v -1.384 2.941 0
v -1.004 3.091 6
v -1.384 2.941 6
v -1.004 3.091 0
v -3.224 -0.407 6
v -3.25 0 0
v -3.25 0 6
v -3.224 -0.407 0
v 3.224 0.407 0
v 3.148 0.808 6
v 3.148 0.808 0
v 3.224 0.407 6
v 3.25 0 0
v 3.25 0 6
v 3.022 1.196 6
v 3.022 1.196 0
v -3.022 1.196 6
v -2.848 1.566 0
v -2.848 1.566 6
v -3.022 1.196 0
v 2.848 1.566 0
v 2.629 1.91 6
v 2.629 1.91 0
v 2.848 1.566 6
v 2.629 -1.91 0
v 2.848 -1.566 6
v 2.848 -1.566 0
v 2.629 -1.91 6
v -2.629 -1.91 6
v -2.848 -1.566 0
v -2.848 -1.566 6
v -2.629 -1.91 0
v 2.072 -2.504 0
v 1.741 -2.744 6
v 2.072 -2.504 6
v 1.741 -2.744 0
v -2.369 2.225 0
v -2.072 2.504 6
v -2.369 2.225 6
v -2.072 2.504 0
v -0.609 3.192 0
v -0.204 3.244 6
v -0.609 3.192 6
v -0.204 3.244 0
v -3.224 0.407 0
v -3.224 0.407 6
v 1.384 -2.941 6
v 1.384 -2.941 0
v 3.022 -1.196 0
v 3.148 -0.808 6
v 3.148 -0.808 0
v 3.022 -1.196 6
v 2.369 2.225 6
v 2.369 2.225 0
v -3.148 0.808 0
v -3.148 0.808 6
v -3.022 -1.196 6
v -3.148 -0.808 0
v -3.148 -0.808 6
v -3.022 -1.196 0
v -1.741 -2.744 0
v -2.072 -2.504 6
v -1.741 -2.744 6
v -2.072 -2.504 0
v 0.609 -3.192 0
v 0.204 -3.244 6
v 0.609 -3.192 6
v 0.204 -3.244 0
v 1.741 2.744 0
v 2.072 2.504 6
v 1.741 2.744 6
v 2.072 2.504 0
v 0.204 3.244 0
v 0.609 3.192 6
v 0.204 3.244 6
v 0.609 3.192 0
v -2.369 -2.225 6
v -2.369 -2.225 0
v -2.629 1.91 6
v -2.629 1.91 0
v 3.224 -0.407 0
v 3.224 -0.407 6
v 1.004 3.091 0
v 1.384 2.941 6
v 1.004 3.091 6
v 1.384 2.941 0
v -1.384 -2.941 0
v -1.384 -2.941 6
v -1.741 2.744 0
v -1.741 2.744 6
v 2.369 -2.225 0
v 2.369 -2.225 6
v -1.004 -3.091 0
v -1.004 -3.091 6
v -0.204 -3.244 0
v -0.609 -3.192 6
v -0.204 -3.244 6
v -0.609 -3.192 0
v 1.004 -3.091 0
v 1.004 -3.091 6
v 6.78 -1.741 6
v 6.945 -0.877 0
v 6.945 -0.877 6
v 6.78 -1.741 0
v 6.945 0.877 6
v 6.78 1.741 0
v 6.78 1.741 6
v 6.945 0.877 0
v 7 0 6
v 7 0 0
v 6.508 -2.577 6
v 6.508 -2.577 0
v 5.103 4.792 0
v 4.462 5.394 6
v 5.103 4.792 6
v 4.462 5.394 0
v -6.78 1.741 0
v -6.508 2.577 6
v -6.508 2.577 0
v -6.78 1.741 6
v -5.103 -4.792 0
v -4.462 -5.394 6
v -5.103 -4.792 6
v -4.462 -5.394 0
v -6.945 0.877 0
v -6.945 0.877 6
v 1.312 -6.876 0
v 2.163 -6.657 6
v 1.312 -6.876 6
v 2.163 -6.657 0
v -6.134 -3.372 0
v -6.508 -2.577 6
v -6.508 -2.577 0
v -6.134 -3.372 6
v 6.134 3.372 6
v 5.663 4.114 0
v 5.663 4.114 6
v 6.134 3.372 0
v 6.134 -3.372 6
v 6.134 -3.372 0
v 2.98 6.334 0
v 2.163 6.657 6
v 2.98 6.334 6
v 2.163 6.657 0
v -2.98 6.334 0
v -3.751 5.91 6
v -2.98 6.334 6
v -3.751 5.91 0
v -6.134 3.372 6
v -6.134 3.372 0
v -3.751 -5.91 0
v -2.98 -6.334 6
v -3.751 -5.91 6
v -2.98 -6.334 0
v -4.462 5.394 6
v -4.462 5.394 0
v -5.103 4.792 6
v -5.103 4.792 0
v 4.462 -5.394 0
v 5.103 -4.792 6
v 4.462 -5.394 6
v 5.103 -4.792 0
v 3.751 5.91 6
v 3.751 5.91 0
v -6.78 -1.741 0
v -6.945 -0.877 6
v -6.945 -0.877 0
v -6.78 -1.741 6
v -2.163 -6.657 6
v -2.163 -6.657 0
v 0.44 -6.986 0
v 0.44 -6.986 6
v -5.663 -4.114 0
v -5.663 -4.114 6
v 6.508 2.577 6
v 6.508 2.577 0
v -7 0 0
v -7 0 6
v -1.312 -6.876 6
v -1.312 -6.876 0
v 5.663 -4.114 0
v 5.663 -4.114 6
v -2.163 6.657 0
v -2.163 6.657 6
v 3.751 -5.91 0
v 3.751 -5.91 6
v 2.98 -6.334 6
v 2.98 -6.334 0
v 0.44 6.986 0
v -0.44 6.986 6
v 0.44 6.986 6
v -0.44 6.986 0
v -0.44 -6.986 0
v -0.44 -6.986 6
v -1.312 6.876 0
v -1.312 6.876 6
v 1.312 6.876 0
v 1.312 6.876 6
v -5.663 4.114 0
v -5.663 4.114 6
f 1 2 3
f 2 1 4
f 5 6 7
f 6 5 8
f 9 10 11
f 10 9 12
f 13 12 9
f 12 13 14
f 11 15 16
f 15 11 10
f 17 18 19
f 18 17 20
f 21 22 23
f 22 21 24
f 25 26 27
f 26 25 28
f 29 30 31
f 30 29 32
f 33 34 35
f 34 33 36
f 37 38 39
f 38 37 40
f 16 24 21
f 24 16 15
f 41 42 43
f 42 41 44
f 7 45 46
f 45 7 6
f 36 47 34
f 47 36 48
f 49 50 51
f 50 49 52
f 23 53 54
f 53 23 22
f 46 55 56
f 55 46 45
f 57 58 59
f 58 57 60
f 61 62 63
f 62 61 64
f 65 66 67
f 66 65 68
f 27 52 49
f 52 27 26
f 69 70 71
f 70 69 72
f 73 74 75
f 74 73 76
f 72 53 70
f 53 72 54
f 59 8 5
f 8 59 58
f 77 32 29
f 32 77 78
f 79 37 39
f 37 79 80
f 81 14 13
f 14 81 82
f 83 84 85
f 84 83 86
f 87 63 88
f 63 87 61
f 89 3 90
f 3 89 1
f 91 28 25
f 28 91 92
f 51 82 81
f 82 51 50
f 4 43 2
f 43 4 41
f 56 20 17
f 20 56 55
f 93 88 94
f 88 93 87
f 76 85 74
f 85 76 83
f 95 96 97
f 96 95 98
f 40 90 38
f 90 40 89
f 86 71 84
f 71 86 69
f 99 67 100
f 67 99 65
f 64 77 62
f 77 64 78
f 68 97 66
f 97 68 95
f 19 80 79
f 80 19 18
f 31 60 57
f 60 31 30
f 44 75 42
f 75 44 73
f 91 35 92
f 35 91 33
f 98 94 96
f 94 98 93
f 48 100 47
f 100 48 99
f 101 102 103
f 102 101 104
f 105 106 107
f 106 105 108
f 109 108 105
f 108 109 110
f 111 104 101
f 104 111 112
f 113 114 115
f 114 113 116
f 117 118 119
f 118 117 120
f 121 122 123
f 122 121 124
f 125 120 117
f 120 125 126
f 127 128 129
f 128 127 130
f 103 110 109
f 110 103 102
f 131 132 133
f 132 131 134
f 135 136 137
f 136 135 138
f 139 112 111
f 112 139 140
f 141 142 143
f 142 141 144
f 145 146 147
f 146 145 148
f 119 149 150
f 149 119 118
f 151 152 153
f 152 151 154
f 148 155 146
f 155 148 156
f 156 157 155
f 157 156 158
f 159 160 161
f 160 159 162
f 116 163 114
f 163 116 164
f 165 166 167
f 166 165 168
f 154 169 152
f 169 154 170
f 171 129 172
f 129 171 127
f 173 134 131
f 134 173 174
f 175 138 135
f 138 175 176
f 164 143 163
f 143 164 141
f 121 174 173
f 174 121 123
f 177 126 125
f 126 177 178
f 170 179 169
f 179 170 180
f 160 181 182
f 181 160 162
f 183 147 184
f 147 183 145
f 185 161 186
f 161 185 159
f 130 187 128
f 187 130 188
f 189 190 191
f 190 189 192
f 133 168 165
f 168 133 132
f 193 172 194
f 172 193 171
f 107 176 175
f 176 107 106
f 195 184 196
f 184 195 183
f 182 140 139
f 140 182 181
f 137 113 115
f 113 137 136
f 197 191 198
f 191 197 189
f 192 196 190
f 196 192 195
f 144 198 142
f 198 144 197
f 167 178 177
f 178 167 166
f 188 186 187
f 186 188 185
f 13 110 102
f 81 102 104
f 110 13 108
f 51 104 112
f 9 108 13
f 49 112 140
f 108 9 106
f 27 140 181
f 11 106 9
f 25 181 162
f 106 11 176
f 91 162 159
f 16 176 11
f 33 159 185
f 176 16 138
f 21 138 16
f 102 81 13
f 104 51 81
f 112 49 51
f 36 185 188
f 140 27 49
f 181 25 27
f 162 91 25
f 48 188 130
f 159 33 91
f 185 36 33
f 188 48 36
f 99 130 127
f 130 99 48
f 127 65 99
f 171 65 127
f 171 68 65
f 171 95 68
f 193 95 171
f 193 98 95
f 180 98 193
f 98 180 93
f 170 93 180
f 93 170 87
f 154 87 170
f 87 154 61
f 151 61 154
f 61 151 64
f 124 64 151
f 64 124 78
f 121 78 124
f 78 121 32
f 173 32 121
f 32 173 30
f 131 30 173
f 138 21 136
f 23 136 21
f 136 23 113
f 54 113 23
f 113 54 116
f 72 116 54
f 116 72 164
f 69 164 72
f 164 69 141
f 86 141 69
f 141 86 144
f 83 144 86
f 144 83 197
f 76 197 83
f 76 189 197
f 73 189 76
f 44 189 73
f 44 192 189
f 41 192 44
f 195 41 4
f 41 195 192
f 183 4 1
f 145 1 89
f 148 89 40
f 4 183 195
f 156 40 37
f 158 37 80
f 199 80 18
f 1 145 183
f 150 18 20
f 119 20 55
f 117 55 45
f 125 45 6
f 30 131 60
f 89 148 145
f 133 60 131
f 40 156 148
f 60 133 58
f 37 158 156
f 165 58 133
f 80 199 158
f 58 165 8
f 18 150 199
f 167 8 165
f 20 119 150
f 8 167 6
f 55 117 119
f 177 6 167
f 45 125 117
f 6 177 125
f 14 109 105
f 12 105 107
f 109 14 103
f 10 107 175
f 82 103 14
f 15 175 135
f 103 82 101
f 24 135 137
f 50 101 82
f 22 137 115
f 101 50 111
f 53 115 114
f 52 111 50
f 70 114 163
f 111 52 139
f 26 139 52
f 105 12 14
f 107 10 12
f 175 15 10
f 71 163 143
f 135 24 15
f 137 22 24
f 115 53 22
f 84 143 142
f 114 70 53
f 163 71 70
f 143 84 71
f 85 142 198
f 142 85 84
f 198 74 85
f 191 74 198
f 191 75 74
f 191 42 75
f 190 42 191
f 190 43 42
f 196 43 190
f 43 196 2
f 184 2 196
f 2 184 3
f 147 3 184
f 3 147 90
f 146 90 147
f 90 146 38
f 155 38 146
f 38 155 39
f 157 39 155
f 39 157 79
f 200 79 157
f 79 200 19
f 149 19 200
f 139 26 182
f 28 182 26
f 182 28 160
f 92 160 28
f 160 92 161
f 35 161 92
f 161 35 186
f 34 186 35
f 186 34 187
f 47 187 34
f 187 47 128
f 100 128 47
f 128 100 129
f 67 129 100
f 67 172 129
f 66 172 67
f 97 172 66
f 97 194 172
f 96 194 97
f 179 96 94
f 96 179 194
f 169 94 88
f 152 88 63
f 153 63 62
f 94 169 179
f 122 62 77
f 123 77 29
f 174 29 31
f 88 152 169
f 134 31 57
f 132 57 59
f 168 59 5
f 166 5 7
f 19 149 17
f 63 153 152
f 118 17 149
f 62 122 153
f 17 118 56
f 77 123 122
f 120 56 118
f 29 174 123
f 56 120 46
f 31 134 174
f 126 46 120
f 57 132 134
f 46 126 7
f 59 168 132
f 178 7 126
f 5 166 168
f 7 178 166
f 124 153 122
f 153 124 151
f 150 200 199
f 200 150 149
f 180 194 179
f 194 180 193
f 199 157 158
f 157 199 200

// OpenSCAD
$fn = 50;

difference() {
	union() {
		cylinder(h = 6, r = 7.0);
	}
	union() {
		translate(v = [0.0, 0.0, -100.0]) {
			cylinder(h = 200, r = 3.25);
		}
		translate(v = [0.0, 0.0, -100.0]) {
			cylinder(h = 200, r = 1.8);
		}
		cylinder(h = 6, r = 3.0);
	}
}
